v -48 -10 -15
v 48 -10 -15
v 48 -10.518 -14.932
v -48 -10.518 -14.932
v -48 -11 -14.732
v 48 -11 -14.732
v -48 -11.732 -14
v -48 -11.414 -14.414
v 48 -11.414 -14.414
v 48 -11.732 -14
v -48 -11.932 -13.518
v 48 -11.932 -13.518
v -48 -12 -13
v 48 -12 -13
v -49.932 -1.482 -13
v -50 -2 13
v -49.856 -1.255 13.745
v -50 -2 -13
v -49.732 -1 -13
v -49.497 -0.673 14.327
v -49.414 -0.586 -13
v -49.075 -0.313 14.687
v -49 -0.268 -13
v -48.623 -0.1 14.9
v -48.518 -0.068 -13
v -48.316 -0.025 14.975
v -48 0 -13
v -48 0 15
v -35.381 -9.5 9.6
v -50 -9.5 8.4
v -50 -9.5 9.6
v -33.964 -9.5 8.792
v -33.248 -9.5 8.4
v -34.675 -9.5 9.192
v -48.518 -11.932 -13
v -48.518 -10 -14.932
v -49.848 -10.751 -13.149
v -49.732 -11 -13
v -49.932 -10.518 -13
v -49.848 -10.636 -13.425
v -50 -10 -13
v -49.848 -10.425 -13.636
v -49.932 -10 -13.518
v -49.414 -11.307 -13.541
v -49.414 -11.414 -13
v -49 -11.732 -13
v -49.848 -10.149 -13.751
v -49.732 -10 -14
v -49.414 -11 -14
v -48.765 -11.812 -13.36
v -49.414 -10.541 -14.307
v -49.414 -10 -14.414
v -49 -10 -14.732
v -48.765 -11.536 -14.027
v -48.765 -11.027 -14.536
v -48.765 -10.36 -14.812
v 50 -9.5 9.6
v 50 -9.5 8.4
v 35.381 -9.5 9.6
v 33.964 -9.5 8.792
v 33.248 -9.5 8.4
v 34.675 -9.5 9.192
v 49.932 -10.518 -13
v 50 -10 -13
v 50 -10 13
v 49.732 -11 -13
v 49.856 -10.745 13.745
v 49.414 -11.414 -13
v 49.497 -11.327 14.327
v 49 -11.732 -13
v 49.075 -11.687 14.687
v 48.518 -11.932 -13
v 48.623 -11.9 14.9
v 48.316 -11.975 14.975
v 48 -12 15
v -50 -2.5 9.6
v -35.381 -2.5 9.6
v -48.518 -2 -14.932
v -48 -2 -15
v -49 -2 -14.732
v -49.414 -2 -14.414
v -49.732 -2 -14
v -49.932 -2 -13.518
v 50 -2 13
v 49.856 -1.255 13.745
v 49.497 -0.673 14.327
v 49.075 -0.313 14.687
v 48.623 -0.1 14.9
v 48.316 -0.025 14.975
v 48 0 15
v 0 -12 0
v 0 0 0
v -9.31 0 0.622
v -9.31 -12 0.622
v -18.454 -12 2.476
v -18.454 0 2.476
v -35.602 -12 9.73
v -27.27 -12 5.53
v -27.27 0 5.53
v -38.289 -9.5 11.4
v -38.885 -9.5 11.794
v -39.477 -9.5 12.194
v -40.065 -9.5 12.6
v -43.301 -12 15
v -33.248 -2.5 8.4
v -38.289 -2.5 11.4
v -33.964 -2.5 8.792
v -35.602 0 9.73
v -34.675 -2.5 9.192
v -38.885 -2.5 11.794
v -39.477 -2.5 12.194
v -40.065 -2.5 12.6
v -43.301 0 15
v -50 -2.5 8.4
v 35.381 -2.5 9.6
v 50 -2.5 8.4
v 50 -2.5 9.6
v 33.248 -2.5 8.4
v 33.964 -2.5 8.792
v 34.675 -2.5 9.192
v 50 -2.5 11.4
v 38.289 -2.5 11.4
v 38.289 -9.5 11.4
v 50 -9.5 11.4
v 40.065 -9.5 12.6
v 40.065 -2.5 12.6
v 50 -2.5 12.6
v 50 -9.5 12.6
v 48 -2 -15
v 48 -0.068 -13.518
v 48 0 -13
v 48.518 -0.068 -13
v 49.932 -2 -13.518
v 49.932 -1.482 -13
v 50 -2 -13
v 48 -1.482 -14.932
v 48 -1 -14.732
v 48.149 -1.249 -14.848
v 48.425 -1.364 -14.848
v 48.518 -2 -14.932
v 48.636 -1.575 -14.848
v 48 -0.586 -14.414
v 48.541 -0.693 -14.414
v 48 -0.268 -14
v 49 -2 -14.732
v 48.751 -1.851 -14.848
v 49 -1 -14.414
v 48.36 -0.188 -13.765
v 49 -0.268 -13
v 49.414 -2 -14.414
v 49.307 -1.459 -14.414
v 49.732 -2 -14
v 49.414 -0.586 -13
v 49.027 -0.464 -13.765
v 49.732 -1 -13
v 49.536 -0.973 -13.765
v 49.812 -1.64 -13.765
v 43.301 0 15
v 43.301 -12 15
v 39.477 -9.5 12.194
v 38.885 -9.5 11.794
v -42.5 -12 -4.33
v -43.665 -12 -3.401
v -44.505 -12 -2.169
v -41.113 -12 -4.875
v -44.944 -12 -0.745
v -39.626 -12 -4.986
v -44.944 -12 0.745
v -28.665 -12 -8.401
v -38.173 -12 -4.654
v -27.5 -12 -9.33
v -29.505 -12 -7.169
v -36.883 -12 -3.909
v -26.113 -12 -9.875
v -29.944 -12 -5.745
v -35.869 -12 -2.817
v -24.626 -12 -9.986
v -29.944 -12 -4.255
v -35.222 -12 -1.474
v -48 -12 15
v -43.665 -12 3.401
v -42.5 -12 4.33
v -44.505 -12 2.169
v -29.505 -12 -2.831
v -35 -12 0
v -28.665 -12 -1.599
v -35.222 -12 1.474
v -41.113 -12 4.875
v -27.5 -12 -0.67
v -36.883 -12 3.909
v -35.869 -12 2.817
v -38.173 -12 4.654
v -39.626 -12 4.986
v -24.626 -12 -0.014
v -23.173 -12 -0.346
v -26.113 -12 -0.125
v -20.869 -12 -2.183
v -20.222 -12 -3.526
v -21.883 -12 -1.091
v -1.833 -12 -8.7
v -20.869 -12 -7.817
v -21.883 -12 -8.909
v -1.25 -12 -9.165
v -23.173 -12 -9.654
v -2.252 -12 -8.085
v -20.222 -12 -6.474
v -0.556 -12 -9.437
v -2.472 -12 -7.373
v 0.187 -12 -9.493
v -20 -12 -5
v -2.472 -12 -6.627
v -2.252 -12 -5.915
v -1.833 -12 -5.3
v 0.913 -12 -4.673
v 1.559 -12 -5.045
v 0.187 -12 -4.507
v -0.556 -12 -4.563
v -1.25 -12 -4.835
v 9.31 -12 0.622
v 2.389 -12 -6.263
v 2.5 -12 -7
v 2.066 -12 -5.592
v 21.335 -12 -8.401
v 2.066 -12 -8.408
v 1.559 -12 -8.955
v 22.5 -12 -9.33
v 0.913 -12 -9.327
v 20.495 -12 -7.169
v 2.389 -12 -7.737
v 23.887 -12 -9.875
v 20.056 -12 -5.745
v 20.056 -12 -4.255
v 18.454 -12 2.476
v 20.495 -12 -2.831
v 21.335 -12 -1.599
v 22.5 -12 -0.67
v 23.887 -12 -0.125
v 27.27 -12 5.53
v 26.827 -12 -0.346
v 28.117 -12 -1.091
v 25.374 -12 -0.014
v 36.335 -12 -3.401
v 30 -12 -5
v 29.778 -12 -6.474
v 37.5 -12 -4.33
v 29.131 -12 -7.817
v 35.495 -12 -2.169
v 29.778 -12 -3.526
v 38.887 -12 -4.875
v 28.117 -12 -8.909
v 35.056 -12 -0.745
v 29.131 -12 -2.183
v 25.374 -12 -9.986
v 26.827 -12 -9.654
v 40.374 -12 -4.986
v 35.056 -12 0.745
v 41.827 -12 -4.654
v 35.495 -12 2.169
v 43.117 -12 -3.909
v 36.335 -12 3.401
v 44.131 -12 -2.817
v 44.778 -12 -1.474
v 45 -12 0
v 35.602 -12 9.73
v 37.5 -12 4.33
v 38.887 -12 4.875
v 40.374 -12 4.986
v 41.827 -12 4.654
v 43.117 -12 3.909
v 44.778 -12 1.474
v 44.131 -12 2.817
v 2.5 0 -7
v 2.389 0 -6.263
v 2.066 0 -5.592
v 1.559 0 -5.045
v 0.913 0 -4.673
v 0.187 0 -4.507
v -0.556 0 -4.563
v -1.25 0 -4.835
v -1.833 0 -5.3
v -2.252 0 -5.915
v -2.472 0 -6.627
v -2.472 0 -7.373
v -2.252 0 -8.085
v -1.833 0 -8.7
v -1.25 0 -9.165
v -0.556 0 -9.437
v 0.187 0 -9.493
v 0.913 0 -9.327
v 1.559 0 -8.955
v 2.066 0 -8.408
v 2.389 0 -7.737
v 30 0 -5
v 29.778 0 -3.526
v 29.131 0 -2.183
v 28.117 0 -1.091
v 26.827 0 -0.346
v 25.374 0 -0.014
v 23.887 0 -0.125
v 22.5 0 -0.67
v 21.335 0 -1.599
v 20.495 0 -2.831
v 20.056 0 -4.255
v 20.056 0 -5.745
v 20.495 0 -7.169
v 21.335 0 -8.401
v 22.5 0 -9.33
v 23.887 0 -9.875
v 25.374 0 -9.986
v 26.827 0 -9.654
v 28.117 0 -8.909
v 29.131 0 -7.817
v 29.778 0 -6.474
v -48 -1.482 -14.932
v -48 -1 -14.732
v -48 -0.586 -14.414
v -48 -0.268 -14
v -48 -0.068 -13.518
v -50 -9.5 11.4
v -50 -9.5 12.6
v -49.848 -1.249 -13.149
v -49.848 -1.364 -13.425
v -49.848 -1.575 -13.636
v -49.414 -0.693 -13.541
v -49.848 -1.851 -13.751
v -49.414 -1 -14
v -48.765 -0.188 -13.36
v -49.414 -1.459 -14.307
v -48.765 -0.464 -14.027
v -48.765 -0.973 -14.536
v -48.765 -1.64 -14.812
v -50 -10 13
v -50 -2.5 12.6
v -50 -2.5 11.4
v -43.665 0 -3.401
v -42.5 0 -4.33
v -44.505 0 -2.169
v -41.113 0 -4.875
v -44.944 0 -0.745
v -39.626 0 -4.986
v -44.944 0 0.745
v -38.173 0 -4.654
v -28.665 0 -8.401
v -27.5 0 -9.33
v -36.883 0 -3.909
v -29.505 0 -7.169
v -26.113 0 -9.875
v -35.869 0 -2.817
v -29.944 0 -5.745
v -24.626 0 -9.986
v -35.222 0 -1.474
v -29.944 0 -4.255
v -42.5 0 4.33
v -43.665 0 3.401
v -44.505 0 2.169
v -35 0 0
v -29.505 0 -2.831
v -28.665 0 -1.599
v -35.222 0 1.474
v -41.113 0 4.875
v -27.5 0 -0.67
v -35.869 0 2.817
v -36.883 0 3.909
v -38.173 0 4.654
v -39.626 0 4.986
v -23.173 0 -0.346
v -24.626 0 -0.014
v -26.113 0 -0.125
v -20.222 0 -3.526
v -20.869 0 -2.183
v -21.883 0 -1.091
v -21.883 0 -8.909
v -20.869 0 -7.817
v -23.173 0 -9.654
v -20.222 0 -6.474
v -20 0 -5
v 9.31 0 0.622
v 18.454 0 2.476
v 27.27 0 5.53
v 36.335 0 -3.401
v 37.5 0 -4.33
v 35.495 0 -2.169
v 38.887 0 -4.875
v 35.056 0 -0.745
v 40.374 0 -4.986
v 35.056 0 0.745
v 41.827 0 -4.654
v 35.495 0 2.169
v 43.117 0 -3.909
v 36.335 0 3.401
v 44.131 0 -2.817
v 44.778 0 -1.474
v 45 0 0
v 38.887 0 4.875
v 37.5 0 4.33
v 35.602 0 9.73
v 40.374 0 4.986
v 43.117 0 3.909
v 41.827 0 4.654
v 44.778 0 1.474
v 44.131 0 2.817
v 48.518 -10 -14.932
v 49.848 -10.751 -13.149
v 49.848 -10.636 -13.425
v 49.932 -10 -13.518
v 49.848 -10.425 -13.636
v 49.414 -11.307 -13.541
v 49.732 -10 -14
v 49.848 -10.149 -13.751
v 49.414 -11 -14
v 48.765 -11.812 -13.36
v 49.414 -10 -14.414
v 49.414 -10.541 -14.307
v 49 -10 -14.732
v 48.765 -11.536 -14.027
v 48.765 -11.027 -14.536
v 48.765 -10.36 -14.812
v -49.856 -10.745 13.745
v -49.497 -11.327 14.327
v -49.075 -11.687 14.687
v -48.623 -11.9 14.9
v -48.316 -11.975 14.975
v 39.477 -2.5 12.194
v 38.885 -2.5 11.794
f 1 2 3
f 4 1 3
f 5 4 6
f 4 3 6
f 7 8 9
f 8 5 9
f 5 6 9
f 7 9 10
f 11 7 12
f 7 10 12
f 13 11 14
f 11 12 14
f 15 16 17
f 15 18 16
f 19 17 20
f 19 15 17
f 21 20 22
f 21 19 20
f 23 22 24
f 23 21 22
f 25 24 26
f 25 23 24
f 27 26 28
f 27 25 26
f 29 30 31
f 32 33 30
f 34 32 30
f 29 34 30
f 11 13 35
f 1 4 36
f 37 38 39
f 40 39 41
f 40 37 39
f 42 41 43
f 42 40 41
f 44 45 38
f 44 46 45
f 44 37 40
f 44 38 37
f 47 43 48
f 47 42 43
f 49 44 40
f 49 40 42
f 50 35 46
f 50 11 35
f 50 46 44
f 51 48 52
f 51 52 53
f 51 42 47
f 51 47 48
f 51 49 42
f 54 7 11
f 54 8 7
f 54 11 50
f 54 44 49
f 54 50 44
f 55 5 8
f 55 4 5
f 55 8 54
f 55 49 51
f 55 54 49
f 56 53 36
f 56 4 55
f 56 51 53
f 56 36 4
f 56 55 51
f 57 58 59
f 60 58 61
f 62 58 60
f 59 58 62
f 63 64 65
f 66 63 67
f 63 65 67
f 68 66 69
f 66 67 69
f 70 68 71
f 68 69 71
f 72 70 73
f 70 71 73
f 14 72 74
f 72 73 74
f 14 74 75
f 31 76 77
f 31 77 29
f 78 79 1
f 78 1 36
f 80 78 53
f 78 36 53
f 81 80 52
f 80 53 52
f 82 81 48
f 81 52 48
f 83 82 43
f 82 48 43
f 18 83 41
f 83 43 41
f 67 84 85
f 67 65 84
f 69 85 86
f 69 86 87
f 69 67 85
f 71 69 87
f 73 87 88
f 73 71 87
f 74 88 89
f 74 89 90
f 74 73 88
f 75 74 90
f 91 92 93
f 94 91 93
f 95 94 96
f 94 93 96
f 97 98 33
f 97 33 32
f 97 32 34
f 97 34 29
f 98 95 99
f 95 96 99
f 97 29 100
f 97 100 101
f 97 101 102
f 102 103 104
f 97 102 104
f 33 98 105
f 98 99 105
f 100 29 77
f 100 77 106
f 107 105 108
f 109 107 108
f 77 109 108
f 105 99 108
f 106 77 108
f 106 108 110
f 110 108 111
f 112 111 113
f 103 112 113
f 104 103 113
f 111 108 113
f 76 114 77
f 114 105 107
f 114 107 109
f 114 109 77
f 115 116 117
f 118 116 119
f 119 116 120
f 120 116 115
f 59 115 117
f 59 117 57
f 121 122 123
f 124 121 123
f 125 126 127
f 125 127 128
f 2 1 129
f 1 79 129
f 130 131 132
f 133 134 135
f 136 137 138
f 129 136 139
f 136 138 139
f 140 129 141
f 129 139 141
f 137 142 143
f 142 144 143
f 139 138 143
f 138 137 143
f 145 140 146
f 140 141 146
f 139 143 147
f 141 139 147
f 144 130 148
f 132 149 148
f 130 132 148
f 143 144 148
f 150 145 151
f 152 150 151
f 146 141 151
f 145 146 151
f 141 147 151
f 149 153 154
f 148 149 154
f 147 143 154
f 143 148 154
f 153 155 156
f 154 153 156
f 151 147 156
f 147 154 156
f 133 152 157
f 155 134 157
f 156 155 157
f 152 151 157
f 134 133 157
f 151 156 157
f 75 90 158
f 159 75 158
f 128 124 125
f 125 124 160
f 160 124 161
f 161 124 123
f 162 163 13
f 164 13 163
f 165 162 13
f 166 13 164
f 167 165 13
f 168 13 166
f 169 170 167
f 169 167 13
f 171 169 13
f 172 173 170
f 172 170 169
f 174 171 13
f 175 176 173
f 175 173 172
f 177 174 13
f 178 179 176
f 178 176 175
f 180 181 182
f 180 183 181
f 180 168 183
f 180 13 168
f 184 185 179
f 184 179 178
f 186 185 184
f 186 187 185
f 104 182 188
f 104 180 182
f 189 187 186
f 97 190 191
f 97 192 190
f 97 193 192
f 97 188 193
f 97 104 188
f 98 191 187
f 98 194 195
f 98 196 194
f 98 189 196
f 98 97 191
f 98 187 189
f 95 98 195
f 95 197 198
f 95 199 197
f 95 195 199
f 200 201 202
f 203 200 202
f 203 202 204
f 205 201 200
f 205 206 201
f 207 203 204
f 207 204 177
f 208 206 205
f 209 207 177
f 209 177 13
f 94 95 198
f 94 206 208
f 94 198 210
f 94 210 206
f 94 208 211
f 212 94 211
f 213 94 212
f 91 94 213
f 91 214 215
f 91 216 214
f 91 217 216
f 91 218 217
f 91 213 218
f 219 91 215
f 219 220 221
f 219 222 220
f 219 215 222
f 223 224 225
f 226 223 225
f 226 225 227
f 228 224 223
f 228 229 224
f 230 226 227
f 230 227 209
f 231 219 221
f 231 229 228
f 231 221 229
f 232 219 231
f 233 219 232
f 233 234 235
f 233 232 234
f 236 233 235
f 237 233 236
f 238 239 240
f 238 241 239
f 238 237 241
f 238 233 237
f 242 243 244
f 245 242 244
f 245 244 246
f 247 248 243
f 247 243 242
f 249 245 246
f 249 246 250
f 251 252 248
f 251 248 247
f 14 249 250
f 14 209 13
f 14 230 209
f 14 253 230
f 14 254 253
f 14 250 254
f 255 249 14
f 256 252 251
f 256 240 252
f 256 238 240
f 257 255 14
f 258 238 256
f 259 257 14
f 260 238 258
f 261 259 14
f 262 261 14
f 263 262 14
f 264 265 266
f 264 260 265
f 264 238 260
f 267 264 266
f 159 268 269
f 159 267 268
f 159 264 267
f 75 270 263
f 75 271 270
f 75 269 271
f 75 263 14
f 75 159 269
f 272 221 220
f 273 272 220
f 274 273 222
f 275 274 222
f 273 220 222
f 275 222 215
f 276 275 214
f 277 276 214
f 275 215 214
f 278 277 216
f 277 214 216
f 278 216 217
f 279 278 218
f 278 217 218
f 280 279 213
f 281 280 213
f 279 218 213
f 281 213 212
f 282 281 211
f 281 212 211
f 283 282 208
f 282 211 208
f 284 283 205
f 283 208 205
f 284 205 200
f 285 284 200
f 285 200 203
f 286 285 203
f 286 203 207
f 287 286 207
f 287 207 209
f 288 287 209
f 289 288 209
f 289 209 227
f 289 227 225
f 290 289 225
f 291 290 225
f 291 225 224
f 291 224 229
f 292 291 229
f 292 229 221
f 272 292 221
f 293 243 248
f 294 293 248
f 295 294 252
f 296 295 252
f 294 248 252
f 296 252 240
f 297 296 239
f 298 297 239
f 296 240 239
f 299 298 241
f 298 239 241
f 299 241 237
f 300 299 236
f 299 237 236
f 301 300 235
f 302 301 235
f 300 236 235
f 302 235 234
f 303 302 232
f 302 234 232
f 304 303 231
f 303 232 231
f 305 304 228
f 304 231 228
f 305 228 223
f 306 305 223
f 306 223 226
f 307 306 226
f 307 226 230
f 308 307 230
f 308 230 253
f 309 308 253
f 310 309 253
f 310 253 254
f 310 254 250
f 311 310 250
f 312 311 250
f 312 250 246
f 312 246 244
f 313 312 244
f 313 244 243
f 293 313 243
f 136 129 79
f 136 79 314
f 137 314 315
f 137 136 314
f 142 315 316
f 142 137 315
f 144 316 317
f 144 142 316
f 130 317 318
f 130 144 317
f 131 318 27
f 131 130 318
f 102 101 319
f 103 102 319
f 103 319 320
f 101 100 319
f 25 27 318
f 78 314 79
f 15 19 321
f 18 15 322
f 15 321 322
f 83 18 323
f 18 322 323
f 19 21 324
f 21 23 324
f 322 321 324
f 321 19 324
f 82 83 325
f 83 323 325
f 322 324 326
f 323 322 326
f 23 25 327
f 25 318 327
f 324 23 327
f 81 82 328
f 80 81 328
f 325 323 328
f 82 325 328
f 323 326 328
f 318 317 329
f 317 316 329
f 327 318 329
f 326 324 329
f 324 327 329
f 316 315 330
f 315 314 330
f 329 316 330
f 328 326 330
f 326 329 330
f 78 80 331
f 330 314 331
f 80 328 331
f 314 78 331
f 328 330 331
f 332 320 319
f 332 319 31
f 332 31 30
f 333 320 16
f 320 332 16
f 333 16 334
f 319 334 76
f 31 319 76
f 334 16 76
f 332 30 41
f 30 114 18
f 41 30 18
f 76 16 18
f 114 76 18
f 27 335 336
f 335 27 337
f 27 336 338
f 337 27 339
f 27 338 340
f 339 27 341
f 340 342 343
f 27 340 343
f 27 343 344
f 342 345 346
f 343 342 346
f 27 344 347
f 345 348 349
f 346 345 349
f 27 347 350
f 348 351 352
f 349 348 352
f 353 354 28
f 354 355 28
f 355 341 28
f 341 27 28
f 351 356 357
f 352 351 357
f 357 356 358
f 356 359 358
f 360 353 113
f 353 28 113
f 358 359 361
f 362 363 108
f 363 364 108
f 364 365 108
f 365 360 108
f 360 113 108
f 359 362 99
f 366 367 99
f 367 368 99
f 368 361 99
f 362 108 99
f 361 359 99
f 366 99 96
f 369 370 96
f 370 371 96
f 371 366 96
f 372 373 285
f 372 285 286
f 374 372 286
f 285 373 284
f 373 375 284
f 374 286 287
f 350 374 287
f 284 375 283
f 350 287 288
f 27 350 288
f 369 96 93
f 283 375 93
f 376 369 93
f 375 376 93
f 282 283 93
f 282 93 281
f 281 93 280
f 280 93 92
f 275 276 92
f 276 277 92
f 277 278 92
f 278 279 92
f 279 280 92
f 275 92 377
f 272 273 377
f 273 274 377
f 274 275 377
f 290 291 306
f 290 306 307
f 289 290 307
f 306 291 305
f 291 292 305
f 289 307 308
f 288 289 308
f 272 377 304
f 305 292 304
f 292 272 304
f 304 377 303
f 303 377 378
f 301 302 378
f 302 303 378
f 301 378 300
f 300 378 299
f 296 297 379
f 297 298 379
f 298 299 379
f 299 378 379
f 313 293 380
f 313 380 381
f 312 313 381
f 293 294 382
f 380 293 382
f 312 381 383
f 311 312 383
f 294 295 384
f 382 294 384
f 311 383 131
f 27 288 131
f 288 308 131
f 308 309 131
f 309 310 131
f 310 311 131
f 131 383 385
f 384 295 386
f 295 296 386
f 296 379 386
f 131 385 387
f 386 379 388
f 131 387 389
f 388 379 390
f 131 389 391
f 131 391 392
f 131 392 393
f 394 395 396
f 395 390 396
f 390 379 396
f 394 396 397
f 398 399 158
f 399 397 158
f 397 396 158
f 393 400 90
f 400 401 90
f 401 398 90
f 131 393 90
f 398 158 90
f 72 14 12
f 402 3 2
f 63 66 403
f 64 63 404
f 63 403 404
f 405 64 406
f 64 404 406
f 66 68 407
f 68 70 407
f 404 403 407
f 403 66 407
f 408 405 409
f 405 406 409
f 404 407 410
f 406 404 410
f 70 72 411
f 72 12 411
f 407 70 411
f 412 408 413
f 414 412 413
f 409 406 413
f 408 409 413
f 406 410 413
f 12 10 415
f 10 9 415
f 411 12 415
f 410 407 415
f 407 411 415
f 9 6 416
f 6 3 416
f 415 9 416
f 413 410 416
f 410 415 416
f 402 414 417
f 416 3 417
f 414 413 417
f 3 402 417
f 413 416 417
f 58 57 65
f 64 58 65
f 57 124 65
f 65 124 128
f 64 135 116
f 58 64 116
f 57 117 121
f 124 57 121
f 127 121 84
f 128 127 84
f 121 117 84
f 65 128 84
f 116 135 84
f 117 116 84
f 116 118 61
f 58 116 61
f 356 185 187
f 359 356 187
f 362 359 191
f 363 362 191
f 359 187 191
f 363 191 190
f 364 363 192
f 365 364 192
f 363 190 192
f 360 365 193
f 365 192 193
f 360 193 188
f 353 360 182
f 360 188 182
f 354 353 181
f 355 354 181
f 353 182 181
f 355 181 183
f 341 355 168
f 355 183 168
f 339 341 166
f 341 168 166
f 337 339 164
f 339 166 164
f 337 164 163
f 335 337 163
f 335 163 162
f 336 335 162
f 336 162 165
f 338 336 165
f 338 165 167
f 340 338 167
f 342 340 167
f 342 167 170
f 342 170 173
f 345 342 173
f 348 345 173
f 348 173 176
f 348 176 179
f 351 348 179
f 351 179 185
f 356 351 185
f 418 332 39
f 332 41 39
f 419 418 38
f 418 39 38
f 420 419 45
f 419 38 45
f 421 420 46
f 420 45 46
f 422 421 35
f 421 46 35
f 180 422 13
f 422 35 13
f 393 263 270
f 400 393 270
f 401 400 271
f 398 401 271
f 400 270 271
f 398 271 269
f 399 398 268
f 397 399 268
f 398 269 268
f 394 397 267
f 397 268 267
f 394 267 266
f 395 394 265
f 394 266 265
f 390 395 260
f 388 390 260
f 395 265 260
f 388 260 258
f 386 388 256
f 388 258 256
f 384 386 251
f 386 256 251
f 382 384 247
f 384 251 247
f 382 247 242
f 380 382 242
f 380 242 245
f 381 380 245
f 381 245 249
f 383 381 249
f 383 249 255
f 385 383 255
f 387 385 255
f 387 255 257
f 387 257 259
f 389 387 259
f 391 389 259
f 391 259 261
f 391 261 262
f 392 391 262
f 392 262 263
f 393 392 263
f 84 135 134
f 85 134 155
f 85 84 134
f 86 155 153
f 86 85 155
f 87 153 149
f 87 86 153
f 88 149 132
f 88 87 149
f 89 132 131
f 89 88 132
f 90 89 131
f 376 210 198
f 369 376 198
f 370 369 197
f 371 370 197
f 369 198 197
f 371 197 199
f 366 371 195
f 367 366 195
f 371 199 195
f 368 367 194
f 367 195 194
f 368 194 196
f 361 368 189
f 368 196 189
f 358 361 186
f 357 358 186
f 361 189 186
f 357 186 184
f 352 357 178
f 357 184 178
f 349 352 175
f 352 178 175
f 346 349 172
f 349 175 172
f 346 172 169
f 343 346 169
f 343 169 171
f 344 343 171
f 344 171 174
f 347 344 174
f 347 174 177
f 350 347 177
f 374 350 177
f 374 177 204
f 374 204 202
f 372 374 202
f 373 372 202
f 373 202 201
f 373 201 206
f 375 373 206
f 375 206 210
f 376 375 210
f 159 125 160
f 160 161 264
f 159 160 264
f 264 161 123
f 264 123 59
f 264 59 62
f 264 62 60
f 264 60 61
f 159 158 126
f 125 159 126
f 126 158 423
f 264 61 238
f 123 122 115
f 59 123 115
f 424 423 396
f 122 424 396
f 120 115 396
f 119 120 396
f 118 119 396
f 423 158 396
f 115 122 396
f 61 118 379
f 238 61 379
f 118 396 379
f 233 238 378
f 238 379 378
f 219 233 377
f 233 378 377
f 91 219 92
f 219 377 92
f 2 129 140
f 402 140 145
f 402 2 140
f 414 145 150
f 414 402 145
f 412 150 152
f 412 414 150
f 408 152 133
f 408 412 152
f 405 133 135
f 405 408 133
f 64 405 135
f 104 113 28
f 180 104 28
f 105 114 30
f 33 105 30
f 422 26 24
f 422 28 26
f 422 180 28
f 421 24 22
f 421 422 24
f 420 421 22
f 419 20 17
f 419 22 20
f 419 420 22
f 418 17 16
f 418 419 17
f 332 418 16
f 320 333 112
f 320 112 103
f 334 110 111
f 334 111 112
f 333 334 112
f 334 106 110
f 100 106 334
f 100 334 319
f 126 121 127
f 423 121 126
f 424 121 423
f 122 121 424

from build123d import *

# Parameters (mm, degrees)
F1_DEPTH = 12
F2_R     = 2
F3_R     = 5
F3_R_2   = 2.5
F4_DEPTH = 12.001
F5_W     = 7
F5_H     = 1.2
F6_DEPTH = 100.001


with BuildPart() as f1:
    # F0 (on Front) → F1 (new body)
    with BuildSketch(Plane.XZ):
        with BuildLine():
            Line((-50, -15), (50, -15))
            Line((50, -15), (50, 15))
            Line((50, 15), (43.30127, 15))
            ThreePointArc((43.30127, 15), (22.912878, 3.856217), (0, 0))
            ThreePointArc((0, 0), (-22.912878, 3.856217), (-43.30127, 15))
            Line((-43.30127, 15), (-50, 15))
            Line((-50, 15), (-50, -15))
        make_face()
    extrude(amount=F1_DEPTH)

    # F2
    f2_edges = [f1.edges().sort_by_distance(p)[0] for p in [
        (0, -12, -15),
        (-50, -12, 0),
        (50, -12, 0),
        (50, 0, 0),
        (0, 0, -15),
        (-50, 0, 0),
        (-50, -6, -15),
        (50, -6, -15),
        (50, -6, 15),
        (-50, -6, 15),
    ]]
    fillet(f2_edges, radius=F2_R)

    # F3 (on face) → F4 (cut, through all)
    with BuildSketch(Plane.XZ.offset(12)):
        with Locations((-25, -5)):
            Circle(F3_R)
        with Locations((-40, 0)):
            Circle(F3_R)
        with Locations((0, -7)):
            Circle(F3_R_2)
        with Locations((25, -5)):
            Circle(F3_R)
        with Locations((40, 0)):
            Circle(F3_R)
    extrude(amount=-F4_DEPTH, mode=Mode.SUBTRACT)

    # F5 (on face) → F6 (cut, through all)
    with BuildSketch(Plane(origin=(-50, 0, 0), x_dir=(0, -1, 0), z_dir=(-1, 0, 0))):
        with Locations((6, 12)):
            Rectangle(F5_W, F5_H)
        with Locations((6, 9)):
            Rectangle(F5_W, F5_H)
    extrude(amount=-F6_DEPTH, mode=Mode.SUBTRACT)


solid = f1.part
